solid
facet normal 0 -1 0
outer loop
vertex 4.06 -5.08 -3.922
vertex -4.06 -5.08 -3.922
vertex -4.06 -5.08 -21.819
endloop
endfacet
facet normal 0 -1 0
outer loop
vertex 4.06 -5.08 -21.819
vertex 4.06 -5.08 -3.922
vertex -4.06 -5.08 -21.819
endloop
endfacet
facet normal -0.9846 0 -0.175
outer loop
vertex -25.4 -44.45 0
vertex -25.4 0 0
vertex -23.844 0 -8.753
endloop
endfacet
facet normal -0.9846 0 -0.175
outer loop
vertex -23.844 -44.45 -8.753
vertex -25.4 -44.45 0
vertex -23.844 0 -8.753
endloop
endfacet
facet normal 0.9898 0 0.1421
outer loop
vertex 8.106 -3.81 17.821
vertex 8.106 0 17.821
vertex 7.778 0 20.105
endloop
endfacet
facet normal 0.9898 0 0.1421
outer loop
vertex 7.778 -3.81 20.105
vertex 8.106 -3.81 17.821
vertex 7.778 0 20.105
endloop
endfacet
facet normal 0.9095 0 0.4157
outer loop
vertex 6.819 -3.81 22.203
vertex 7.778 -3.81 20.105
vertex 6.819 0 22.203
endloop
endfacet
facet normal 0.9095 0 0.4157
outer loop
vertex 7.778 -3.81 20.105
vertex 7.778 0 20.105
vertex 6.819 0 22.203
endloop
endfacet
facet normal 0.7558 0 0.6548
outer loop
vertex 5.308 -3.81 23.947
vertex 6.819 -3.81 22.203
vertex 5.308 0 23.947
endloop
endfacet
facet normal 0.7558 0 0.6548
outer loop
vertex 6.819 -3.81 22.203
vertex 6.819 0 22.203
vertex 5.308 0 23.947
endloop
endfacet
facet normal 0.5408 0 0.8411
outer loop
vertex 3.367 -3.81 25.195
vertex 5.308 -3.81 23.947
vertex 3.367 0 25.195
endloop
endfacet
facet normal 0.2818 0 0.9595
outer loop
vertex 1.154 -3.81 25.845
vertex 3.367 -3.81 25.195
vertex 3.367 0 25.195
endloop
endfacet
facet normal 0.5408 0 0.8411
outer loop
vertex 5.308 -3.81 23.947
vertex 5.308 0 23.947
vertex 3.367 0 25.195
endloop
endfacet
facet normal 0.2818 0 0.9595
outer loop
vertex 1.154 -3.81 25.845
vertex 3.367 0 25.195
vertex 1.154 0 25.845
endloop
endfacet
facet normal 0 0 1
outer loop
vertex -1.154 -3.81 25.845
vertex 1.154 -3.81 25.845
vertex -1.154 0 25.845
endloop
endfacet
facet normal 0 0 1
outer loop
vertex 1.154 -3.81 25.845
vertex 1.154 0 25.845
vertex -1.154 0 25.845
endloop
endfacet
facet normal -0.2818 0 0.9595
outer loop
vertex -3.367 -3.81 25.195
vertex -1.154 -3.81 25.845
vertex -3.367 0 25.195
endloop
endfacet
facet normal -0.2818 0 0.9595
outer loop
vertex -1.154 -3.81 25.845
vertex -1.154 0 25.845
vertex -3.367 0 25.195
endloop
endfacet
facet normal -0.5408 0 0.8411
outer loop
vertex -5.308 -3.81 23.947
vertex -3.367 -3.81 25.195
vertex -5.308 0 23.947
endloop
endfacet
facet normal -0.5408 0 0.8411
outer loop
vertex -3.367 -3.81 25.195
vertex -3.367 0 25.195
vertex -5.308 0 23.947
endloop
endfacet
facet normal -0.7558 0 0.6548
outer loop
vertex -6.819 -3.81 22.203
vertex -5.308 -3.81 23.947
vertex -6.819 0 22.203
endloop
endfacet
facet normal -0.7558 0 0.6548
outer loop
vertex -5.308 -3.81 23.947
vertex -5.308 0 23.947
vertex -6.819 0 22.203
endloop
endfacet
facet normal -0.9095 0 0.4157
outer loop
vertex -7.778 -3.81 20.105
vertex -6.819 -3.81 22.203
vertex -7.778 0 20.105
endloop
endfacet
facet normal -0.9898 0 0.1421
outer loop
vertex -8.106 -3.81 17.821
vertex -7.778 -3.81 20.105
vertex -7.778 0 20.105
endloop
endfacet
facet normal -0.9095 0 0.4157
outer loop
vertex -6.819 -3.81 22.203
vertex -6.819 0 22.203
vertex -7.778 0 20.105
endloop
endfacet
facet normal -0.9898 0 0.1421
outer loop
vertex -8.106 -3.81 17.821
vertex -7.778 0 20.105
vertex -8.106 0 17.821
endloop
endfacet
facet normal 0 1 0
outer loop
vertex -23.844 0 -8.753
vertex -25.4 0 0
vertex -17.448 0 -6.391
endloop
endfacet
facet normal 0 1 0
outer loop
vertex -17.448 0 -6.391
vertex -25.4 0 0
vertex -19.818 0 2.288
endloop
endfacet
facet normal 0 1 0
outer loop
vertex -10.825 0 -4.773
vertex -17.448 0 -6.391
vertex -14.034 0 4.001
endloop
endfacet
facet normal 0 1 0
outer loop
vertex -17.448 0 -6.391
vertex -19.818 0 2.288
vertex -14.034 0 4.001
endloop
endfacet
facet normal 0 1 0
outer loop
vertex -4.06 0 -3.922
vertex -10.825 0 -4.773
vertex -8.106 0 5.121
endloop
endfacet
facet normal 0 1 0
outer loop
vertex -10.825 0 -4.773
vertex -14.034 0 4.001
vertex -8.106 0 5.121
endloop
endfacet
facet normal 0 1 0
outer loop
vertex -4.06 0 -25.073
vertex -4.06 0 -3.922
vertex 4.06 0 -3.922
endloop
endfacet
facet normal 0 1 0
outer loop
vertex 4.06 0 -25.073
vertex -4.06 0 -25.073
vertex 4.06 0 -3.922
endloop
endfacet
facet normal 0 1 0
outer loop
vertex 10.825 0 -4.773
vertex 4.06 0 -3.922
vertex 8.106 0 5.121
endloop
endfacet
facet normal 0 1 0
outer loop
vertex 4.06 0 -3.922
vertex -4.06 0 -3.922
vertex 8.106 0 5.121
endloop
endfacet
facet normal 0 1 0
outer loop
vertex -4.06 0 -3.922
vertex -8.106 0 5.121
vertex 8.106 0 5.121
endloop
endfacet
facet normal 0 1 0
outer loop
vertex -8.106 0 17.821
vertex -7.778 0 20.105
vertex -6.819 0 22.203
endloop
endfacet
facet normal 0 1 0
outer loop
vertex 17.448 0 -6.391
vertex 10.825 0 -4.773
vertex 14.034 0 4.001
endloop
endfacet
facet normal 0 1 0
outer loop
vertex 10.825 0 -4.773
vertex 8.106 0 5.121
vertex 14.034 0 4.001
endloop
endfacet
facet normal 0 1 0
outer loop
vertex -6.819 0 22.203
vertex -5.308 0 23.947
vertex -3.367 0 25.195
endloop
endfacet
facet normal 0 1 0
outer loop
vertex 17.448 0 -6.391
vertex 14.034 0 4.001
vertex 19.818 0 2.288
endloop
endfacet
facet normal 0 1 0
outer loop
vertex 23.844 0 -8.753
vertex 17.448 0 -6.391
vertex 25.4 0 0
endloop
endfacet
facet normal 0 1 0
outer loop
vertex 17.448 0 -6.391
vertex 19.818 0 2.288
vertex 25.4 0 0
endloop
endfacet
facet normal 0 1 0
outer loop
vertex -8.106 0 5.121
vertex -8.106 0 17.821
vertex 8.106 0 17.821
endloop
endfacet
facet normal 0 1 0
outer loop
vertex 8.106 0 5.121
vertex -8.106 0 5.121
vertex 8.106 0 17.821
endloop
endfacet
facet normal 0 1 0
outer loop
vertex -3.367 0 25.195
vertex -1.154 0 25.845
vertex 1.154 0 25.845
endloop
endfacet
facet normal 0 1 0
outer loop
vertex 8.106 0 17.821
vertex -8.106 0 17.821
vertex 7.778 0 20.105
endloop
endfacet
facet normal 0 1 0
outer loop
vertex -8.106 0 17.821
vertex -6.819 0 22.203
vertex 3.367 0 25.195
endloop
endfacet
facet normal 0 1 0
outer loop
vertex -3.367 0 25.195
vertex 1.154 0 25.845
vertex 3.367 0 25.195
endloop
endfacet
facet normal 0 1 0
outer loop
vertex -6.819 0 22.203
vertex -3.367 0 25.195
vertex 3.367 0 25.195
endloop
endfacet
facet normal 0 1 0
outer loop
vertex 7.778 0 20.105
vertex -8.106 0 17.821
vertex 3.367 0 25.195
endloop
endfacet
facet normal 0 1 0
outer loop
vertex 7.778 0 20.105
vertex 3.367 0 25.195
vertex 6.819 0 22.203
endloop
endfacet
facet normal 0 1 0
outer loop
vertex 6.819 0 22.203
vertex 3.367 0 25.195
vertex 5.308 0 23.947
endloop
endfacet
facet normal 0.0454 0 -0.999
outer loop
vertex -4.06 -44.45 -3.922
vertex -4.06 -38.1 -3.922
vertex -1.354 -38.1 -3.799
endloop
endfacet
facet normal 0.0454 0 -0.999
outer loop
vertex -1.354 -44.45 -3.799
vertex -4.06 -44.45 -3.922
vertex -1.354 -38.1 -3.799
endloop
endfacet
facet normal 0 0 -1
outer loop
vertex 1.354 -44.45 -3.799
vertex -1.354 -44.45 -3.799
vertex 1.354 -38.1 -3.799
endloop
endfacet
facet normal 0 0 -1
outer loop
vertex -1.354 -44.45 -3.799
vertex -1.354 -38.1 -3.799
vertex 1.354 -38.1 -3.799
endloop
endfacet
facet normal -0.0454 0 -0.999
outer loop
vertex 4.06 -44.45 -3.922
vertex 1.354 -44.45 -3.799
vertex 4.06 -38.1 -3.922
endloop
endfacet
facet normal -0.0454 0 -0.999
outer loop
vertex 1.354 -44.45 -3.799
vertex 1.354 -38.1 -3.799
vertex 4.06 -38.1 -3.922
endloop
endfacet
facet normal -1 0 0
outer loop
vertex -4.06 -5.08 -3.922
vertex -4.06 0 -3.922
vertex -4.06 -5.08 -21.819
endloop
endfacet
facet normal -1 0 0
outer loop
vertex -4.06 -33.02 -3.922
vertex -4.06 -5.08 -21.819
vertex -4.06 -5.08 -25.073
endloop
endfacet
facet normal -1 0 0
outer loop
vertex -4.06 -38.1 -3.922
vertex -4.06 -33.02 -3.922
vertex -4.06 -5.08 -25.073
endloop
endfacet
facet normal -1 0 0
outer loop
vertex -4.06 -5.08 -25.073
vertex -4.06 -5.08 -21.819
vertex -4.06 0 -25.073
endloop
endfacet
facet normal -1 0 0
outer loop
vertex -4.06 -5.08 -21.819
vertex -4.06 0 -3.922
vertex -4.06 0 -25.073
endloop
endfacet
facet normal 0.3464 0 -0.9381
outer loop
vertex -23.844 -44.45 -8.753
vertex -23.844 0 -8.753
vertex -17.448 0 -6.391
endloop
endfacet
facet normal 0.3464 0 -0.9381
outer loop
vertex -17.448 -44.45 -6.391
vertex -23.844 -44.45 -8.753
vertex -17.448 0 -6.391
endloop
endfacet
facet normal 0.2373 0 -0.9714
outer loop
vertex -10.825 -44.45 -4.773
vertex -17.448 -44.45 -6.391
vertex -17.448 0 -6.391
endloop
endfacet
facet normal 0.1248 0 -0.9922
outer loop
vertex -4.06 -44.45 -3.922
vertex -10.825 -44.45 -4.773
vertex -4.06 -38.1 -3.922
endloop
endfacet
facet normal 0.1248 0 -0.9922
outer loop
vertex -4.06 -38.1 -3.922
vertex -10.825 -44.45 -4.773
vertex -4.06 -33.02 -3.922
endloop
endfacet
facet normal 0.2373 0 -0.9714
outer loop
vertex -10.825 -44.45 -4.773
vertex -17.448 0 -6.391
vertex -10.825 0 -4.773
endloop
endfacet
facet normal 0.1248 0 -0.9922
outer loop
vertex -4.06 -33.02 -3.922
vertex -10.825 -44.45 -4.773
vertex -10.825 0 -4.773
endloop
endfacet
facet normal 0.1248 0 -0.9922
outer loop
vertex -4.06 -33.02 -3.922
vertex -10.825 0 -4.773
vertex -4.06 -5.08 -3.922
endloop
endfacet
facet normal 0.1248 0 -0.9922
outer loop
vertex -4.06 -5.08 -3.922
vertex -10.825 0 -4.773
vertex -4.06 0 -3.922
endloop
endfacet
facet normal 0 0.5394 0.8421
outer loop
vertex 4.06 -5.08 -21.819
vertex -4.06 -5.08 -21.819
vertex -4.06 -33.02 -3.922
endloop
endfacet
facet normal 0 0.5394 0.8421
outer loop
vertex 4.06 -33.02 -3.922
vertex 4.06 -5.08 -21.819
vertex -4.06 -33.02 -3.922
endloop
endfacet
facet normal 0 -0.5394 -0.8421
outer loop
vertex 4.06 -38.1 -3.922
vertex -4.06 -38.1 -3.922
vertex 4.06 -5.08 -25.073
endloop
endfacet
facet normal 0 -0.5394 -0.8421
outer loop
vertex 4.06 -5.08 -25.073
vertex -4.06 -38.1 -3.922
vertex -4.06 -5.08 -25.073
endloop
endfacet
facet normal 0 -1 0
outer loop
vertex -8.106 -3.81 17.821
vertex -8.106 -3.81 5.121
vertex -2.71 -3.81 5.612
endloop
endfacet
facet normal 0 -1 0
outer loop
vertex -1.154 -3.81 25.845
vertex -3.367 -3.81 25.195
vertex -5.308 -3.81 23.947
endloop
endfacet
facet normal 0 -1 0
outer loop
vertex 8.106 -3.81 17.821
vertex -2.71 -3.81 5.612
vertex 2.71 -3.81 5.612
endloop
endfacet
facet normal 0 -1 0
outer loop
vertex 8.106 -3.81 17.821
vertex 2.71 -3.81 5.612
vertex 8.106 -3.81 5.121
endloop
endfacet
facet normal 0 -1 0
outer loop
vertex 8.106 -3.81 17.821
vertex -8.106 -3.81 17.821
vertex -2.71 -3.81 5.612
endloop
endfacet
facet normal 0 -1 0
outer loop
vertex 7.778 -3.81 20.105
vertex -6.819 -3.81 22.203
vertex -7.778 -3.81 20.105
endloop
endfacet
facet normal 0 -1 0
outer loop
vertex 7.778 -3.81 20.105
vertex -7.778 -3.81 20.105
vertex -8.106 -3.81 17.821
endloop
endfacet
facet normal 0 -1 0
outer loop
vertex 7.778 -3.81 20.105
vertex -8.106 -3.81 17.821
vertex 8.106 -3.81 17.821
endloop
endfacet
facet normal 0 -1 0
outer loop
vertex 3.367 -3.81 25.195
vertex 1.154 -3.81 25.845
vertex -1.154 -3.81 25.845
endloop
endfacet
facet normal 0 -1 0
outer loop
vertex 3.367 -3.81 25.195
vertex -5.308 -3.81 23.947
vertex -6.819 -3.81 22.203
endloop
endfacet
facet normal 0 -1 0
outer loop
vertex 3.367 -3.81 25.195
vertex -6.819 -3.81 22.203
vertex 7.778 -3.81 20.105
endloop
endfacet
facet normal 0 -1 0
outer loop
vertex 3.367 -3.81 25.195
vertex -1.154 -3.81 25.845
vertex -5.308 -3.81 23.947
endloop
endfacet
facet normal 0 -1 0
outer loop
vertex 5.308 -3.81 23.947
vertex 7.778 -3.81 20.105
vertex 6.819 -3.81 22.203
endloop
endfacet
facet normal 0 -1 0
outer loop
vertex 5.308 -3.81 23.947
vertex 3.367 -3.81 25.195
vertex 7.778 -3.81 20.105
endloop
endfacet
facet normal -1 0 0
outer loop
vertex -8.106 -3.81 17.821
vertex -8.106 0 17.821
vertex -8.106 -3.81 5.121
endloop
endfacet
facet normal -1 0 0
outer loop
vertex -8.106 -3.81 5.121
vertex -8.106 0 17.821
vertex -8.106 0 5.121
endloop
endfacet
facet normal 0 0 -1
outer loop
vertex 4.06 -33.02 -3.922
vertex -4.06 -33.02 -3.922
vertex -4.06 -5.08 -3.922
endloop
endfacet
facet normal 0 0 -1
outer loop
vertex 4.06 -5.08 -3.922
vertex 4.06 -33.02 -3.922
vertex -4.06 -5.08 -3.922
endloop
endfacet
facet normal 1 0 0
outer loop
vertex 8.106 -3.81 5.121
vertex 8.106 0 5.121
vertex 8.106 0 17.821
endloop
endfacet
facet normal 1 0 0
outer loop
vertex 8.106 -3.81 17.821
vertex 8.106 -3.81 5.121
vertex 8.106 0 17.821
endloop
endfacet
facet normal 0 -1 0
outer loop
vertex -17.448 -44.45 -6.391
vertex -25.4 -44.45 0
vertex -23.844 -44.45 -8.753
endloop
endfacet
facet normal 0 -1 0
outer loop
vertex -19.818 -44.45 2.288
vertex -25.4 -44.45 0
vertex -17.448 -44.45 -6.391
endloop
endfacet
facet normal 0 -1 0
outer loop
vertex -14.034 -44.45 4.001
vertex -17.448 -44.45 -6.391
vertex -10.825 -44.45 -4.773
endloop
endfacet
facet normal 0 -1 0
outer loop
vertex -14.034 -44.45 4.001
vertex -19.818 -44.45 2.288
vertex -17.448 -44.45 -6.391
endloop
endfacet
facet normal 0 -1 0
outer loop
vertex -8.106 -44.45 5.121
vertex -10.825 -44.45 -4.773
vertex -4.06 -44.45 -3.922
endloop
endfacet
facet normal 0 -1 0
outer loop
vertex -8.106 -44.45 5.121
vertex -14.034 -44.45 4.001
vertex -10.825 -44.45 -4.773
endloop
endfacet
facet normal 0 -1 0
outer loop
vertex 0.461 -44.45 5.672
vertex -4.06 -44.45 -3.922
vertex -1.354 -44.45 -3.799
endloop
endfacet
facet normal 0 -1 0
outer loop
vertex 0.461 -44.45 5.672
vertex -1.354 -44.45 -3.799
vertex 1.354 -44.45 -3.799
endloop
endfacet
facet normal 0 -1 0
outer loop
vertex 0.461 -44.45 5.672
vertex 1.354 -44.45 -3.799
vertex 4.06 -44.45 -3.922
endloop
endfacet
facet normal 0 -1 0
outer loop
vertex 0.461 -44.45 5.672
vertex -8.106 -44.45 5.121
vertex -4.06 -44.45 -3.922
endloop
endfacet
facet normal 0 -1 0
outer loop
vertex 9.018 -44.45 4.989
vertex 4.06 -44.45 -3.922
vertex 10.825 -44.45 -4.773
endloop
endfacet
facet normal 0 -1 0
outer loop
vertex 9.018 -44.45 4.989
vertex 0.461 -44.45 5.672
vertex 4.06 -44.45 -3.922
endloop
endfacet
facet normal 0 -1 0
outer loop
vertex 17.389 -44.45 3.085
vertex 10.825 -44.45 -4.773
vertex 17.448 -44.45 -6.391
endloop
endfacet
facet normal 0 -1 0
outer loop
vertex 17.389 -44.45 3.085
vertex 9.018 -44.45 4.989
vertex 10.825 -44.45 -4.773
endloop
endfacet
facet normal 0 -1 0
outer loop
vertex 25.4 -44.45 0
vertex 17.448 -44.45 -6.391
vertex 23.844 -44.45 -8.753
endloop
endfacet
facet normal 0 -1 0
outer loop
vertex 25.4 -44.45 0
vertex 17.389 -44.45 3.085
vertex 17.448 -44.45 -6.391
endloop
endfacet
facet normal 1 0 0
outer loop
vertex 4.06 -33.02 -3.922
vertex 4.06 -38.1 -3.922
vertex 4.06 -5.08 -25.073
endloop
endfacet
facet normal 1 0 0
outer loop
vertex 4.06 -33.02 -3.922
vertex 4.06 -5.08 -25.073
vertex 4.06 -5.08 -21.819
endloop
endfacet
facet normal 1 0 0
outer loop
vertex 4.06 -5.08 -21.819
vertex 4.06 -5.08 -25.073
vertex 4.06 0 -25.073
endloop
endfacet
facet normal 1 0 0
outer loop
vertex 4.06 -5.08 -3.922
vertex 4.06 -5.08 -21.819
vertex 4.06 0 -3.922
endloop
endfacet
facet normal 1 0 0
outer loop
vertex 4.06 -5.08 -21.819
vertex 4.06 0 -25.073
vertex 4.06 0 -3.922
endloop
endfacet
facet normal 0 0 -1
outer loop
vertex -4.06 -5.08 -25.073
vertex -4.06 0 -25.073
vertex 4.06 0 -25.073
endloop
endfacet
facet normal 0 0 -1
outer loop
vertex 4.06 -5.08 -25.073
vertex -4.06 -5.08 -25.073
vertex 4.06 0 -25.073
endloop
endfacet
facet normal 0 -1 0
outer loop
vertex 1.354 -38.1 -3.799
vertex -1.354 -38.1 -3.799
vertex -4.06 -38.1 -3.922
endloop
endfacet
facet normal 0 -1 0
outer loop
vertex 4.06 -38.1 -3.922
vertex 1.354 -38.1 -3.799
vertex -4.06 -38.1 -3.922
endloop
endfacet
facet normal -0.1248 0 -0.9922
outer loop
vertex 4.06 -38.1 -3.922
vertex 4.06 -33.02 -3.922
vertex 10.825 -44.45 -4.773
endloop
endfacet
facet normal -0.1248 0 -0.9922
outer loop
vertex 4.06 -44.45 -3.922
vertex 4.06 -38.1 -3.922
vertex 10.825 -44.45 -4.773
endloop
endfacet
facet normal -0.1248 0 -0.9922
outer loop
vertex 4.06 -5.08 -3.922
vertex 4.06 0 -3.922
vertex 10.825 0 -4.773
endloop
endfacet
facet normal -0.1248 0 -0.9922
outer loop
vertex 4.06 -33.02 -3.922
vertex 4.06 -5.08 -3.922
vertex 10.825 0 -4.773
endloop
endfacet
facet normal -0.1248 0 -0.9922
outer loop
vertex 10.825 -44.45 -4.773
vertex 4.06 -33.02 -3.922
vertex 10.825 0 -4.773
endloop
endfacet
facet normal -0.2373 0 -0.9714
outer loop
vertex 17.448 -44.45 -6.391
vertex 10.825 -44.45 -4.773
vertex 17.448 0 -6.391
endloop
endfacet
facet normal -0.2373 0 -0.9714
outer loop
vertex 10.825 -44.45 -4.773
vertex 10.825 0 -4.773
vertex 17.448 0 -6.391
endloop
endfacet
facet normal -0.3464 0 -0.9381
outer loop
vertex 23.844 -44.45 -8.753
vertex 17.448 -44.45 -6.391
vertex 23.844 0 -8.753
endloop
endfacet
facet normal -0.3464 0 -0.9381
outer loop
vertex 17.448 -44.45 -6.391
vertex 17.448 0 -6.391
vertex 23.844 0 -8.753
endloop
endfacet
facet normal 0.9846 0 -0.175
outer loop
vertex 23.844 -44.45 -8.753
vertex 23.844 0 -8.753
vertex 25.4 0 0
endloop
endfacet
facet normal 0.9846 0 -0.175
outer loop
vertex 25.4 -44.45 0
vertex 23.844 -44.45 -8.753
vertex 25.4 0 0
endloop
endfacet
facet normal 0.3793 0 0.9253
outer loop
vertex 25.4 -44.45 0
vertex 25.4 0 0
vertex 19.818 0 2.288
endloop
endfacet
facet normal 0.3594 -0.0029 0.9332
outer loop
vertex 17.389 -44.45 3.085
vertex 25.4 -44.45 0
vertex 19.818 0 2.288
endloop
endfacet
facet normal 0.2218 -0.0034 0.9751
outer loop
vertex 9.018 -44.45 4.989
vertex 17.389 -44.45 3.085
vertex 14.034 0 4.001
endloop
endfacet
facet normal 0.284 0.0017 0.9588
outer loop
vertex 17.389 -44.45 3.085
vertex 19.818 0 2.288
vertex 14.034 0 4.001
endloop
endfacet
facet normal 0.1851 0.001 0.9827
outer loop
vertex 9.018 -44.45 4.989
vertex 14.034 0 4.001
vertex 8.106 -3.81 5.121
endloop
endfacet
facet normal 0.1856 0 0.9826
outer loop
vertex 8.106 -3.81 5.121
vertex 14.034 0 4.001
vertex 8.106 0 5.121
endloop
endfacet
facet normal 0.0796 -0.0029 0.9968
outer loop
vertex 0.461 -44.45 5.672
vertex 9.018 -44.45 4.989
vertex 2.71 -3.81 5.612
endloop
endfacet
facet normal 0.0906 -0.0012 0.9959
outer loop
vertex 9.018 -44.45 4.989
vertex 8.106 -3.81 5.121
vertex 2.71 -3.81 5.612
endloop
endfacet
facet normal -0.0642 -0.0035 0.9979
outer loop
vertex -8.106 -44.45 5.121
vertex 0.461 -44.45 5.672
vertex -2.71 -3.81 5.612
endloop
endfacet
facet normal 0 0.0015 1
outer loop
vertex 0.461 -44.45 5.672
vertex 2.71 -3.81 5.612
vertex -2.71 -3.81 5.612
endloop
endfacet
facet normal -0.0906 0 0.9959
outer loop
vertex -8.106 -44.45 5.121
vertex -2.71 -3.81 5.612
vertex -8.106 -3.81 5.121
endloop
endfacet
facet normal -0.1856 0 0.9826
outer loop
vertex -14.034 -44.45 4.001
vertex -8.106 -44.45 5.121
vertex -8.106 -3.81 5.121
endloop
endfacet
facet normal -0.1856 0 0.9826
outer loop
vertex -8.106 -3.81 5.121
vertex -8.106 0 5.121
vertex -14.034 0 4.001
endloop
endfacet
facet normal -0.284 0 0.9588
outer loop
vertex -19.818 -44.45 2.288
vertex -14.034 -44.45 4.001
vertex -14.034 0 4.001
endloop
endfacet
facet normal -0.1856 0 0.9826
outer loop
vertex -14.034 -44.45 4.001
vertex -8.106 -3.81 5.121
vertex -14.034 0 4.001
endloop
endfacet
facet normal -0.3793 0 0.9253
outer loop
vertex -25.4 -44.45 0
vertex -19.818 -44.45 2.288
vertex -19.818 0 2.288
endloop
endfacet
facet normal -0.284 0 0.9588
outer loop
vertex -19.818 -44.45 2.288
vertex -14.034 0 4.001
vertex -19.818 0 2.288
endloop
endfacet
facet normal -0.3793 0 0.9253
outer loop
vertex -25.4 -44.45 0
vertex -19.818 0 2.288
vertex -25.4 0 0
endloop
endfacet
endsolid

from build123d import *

# Parameters (mm, degrees)
F1_DEPTH = 44.45
F2_DEPTH = 3.81
F3_DEPTH = 38.1
F5_DEPTH = 8.1202849069


with BuildPart() as f1:
    # F0 (on Front) → F1 (new body)
    with BuildSketch(Plane.XZ):
        with BuildLine():
            Line((23.84425, -8.7528133727), (25.4, 0))
            ThreePointArc((25.4, 0), (16.9476626833, 3.2174213406), (8.1062559696, 5.1209269282))
            ThreePointArc((8.1062559696, 5.1209269282), (0, 5.6739273919), (-8.1062559696, 5.1209269282))
            ThreePointArc((-8.1062559696, 5.1209269282), (-16.9476626833, 3.2174213406), (-25.4, 0))
            Line((-25.4, 0), (-23.84425, -8.7528133727))
            ThreePointArc((-23.84425, -8.7528133727), (-14.1597566071, -5.4872651146), (-4.0601424534, -3.9216944037))
            ThreePointArc((-4.0601424534, -3.9216944037), (0, -3.7834478897), (4.0601424534, -3.9216944037))
            ThreePointArc((4.0601424534, -3.9216944037), (14.1597566071, -5.4872651146), (23.84425, -8.7528133727))
        make_face()
    extrude(amount=F1_DEPTH)

    # F0 (on Front) → F2 (join)
    with BuildSketch(Plane.XZ):
        with BuildLine():
            ThreePointArc((-8.1062559696, 5.1209269282), (0, 5.6739273919), (8.1062559696, 5.1209269282))
            Line((8.1062559696, 5.1209269282), (8.1062559696, 17.8209269282))
            ThreePointArc((8.1062559696, 17.8209269282), (0, 25.9271828978), (-8.1062559696, 17.8209269282))
            Line((-8.1062559696, 17.8209269282), (-8.1062559696, 5.1209269282))
        make_face()
    extrude(amount=F2_DEPTH)

    # F0 (on Front) → F3 (join)
    with BuildSketch(Plane.XZ):
        with BuildLine():
            Line((4.0601424534, -25.0733971224), (4.0601424534, -3.9216944037))
            ThreePointArc((4.0601424534, -3.9216944037), (0, -3.7834478897), (-4.0601424534, -3.9216944037))
            Line((-4.0601424534, -3.9216944037), (-4.0601424534, -25.0733971224))
            Line((-4.0601424534, -25.0733971224), (0, -25.0733971224))
            Line((0, -25.0733971224), (4.0601424534, -25.0733971224))
        make_face()
    extrude(amount=F3_DEPTH)

    # F4 (on face) → F5 (cut, through all)
    with BuildSketch(Plane(origin=(-4.0601424534, 0, 0), x_dir=(0, -1, 0), z_dir=(-1, 0, 0))):
        Polygon((33.02, -3.9216944037), (5.08, -3.9216944037), (5.08, -21.8192890118), align=None)
        Polygon((38.1, -3.9216944037), (5.08, -25.0733971224), (38.1, -25.0733971224), align=None)
    extrude(amount=-F5_DEPTH, mode=Mode.SUBTRACT)


solid = f1.part
